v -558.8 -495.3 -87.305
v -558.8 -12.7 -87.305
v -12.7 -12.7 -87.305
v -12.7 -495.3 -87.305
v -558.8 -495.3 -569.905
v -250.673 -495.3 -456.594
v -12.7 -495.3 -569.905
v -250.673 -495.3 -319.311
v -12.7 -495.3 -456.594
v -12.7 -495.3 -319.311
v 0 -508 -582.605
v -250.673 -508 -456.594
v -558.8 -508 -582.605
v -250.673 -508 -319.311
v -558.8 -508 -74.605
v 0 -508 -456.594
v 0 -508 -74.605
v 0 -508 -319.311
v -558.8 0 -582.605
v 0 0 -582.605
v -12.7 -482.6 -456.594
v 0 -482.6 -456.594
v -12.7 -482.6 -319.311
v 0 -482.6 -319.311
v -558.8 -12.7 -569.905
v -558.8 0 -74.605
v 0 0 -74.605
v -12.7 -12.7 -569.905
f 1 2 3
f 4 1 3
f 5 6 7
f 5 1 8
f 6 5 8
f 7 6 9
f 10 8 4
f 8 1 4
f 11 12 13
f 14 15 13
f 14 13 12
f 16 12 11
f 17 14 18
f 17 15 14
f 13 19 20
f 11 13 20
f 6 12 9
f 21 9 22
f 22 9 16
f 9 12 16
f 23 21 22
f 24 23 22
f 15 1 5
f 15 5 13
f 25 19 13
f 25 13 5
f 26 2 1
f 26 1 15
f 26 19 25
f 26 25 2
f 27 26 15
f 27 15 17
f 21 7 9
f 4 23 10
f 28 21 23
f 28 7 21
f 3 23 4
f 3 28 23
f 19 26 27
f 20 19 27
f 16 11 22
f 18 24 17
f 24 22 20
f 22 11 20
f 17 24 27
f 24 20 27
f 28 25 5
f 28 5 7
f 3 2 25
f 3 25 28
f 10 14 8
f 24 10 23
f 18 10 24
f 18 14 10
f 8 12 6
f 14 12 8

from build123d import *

# Parameters (mm, degrees)
F0_W     = 558.8
F0_H     = 508
F1_DEPTH = 508
F2_T     = -12.7
F5_W     = 250.6727086544
F5_H     = 137.283227253
F6_DEPTH = 25.4


# Not quite as in the source:
# - the program builds the solid bodies; features that only make, move or delete a surface that nothing else refers to are left out


with BuildPart() as f1:
    # F0 (on Front) → F1 (new body)
    with BuildSketch(Plane.XZ):
        with Locations((-279.4, -328.6047284609)):
            Rectangle(F0_W, F0_H)
    extrude(amount=F1_DEPTH)

    # F2
    f2_openings = [f1.faces().sort_by_distance(p)[0] for p in [
        (-558.8, -254, -328.604728),
    ]]
    offset(amount=F2_T, openings=f2_openings)

    # F5 (on face) → F6 (cut)
    with BuildSketch(Plane.XZ.offset(508)):
        with Locations((-125.3363543272, -387.9528045654)):
            Rectangle(F5_W, F5_H)
    extrude(amount=-F6_DEPTH, mode=Mode.SUBTRACT)


solid = f1.part
